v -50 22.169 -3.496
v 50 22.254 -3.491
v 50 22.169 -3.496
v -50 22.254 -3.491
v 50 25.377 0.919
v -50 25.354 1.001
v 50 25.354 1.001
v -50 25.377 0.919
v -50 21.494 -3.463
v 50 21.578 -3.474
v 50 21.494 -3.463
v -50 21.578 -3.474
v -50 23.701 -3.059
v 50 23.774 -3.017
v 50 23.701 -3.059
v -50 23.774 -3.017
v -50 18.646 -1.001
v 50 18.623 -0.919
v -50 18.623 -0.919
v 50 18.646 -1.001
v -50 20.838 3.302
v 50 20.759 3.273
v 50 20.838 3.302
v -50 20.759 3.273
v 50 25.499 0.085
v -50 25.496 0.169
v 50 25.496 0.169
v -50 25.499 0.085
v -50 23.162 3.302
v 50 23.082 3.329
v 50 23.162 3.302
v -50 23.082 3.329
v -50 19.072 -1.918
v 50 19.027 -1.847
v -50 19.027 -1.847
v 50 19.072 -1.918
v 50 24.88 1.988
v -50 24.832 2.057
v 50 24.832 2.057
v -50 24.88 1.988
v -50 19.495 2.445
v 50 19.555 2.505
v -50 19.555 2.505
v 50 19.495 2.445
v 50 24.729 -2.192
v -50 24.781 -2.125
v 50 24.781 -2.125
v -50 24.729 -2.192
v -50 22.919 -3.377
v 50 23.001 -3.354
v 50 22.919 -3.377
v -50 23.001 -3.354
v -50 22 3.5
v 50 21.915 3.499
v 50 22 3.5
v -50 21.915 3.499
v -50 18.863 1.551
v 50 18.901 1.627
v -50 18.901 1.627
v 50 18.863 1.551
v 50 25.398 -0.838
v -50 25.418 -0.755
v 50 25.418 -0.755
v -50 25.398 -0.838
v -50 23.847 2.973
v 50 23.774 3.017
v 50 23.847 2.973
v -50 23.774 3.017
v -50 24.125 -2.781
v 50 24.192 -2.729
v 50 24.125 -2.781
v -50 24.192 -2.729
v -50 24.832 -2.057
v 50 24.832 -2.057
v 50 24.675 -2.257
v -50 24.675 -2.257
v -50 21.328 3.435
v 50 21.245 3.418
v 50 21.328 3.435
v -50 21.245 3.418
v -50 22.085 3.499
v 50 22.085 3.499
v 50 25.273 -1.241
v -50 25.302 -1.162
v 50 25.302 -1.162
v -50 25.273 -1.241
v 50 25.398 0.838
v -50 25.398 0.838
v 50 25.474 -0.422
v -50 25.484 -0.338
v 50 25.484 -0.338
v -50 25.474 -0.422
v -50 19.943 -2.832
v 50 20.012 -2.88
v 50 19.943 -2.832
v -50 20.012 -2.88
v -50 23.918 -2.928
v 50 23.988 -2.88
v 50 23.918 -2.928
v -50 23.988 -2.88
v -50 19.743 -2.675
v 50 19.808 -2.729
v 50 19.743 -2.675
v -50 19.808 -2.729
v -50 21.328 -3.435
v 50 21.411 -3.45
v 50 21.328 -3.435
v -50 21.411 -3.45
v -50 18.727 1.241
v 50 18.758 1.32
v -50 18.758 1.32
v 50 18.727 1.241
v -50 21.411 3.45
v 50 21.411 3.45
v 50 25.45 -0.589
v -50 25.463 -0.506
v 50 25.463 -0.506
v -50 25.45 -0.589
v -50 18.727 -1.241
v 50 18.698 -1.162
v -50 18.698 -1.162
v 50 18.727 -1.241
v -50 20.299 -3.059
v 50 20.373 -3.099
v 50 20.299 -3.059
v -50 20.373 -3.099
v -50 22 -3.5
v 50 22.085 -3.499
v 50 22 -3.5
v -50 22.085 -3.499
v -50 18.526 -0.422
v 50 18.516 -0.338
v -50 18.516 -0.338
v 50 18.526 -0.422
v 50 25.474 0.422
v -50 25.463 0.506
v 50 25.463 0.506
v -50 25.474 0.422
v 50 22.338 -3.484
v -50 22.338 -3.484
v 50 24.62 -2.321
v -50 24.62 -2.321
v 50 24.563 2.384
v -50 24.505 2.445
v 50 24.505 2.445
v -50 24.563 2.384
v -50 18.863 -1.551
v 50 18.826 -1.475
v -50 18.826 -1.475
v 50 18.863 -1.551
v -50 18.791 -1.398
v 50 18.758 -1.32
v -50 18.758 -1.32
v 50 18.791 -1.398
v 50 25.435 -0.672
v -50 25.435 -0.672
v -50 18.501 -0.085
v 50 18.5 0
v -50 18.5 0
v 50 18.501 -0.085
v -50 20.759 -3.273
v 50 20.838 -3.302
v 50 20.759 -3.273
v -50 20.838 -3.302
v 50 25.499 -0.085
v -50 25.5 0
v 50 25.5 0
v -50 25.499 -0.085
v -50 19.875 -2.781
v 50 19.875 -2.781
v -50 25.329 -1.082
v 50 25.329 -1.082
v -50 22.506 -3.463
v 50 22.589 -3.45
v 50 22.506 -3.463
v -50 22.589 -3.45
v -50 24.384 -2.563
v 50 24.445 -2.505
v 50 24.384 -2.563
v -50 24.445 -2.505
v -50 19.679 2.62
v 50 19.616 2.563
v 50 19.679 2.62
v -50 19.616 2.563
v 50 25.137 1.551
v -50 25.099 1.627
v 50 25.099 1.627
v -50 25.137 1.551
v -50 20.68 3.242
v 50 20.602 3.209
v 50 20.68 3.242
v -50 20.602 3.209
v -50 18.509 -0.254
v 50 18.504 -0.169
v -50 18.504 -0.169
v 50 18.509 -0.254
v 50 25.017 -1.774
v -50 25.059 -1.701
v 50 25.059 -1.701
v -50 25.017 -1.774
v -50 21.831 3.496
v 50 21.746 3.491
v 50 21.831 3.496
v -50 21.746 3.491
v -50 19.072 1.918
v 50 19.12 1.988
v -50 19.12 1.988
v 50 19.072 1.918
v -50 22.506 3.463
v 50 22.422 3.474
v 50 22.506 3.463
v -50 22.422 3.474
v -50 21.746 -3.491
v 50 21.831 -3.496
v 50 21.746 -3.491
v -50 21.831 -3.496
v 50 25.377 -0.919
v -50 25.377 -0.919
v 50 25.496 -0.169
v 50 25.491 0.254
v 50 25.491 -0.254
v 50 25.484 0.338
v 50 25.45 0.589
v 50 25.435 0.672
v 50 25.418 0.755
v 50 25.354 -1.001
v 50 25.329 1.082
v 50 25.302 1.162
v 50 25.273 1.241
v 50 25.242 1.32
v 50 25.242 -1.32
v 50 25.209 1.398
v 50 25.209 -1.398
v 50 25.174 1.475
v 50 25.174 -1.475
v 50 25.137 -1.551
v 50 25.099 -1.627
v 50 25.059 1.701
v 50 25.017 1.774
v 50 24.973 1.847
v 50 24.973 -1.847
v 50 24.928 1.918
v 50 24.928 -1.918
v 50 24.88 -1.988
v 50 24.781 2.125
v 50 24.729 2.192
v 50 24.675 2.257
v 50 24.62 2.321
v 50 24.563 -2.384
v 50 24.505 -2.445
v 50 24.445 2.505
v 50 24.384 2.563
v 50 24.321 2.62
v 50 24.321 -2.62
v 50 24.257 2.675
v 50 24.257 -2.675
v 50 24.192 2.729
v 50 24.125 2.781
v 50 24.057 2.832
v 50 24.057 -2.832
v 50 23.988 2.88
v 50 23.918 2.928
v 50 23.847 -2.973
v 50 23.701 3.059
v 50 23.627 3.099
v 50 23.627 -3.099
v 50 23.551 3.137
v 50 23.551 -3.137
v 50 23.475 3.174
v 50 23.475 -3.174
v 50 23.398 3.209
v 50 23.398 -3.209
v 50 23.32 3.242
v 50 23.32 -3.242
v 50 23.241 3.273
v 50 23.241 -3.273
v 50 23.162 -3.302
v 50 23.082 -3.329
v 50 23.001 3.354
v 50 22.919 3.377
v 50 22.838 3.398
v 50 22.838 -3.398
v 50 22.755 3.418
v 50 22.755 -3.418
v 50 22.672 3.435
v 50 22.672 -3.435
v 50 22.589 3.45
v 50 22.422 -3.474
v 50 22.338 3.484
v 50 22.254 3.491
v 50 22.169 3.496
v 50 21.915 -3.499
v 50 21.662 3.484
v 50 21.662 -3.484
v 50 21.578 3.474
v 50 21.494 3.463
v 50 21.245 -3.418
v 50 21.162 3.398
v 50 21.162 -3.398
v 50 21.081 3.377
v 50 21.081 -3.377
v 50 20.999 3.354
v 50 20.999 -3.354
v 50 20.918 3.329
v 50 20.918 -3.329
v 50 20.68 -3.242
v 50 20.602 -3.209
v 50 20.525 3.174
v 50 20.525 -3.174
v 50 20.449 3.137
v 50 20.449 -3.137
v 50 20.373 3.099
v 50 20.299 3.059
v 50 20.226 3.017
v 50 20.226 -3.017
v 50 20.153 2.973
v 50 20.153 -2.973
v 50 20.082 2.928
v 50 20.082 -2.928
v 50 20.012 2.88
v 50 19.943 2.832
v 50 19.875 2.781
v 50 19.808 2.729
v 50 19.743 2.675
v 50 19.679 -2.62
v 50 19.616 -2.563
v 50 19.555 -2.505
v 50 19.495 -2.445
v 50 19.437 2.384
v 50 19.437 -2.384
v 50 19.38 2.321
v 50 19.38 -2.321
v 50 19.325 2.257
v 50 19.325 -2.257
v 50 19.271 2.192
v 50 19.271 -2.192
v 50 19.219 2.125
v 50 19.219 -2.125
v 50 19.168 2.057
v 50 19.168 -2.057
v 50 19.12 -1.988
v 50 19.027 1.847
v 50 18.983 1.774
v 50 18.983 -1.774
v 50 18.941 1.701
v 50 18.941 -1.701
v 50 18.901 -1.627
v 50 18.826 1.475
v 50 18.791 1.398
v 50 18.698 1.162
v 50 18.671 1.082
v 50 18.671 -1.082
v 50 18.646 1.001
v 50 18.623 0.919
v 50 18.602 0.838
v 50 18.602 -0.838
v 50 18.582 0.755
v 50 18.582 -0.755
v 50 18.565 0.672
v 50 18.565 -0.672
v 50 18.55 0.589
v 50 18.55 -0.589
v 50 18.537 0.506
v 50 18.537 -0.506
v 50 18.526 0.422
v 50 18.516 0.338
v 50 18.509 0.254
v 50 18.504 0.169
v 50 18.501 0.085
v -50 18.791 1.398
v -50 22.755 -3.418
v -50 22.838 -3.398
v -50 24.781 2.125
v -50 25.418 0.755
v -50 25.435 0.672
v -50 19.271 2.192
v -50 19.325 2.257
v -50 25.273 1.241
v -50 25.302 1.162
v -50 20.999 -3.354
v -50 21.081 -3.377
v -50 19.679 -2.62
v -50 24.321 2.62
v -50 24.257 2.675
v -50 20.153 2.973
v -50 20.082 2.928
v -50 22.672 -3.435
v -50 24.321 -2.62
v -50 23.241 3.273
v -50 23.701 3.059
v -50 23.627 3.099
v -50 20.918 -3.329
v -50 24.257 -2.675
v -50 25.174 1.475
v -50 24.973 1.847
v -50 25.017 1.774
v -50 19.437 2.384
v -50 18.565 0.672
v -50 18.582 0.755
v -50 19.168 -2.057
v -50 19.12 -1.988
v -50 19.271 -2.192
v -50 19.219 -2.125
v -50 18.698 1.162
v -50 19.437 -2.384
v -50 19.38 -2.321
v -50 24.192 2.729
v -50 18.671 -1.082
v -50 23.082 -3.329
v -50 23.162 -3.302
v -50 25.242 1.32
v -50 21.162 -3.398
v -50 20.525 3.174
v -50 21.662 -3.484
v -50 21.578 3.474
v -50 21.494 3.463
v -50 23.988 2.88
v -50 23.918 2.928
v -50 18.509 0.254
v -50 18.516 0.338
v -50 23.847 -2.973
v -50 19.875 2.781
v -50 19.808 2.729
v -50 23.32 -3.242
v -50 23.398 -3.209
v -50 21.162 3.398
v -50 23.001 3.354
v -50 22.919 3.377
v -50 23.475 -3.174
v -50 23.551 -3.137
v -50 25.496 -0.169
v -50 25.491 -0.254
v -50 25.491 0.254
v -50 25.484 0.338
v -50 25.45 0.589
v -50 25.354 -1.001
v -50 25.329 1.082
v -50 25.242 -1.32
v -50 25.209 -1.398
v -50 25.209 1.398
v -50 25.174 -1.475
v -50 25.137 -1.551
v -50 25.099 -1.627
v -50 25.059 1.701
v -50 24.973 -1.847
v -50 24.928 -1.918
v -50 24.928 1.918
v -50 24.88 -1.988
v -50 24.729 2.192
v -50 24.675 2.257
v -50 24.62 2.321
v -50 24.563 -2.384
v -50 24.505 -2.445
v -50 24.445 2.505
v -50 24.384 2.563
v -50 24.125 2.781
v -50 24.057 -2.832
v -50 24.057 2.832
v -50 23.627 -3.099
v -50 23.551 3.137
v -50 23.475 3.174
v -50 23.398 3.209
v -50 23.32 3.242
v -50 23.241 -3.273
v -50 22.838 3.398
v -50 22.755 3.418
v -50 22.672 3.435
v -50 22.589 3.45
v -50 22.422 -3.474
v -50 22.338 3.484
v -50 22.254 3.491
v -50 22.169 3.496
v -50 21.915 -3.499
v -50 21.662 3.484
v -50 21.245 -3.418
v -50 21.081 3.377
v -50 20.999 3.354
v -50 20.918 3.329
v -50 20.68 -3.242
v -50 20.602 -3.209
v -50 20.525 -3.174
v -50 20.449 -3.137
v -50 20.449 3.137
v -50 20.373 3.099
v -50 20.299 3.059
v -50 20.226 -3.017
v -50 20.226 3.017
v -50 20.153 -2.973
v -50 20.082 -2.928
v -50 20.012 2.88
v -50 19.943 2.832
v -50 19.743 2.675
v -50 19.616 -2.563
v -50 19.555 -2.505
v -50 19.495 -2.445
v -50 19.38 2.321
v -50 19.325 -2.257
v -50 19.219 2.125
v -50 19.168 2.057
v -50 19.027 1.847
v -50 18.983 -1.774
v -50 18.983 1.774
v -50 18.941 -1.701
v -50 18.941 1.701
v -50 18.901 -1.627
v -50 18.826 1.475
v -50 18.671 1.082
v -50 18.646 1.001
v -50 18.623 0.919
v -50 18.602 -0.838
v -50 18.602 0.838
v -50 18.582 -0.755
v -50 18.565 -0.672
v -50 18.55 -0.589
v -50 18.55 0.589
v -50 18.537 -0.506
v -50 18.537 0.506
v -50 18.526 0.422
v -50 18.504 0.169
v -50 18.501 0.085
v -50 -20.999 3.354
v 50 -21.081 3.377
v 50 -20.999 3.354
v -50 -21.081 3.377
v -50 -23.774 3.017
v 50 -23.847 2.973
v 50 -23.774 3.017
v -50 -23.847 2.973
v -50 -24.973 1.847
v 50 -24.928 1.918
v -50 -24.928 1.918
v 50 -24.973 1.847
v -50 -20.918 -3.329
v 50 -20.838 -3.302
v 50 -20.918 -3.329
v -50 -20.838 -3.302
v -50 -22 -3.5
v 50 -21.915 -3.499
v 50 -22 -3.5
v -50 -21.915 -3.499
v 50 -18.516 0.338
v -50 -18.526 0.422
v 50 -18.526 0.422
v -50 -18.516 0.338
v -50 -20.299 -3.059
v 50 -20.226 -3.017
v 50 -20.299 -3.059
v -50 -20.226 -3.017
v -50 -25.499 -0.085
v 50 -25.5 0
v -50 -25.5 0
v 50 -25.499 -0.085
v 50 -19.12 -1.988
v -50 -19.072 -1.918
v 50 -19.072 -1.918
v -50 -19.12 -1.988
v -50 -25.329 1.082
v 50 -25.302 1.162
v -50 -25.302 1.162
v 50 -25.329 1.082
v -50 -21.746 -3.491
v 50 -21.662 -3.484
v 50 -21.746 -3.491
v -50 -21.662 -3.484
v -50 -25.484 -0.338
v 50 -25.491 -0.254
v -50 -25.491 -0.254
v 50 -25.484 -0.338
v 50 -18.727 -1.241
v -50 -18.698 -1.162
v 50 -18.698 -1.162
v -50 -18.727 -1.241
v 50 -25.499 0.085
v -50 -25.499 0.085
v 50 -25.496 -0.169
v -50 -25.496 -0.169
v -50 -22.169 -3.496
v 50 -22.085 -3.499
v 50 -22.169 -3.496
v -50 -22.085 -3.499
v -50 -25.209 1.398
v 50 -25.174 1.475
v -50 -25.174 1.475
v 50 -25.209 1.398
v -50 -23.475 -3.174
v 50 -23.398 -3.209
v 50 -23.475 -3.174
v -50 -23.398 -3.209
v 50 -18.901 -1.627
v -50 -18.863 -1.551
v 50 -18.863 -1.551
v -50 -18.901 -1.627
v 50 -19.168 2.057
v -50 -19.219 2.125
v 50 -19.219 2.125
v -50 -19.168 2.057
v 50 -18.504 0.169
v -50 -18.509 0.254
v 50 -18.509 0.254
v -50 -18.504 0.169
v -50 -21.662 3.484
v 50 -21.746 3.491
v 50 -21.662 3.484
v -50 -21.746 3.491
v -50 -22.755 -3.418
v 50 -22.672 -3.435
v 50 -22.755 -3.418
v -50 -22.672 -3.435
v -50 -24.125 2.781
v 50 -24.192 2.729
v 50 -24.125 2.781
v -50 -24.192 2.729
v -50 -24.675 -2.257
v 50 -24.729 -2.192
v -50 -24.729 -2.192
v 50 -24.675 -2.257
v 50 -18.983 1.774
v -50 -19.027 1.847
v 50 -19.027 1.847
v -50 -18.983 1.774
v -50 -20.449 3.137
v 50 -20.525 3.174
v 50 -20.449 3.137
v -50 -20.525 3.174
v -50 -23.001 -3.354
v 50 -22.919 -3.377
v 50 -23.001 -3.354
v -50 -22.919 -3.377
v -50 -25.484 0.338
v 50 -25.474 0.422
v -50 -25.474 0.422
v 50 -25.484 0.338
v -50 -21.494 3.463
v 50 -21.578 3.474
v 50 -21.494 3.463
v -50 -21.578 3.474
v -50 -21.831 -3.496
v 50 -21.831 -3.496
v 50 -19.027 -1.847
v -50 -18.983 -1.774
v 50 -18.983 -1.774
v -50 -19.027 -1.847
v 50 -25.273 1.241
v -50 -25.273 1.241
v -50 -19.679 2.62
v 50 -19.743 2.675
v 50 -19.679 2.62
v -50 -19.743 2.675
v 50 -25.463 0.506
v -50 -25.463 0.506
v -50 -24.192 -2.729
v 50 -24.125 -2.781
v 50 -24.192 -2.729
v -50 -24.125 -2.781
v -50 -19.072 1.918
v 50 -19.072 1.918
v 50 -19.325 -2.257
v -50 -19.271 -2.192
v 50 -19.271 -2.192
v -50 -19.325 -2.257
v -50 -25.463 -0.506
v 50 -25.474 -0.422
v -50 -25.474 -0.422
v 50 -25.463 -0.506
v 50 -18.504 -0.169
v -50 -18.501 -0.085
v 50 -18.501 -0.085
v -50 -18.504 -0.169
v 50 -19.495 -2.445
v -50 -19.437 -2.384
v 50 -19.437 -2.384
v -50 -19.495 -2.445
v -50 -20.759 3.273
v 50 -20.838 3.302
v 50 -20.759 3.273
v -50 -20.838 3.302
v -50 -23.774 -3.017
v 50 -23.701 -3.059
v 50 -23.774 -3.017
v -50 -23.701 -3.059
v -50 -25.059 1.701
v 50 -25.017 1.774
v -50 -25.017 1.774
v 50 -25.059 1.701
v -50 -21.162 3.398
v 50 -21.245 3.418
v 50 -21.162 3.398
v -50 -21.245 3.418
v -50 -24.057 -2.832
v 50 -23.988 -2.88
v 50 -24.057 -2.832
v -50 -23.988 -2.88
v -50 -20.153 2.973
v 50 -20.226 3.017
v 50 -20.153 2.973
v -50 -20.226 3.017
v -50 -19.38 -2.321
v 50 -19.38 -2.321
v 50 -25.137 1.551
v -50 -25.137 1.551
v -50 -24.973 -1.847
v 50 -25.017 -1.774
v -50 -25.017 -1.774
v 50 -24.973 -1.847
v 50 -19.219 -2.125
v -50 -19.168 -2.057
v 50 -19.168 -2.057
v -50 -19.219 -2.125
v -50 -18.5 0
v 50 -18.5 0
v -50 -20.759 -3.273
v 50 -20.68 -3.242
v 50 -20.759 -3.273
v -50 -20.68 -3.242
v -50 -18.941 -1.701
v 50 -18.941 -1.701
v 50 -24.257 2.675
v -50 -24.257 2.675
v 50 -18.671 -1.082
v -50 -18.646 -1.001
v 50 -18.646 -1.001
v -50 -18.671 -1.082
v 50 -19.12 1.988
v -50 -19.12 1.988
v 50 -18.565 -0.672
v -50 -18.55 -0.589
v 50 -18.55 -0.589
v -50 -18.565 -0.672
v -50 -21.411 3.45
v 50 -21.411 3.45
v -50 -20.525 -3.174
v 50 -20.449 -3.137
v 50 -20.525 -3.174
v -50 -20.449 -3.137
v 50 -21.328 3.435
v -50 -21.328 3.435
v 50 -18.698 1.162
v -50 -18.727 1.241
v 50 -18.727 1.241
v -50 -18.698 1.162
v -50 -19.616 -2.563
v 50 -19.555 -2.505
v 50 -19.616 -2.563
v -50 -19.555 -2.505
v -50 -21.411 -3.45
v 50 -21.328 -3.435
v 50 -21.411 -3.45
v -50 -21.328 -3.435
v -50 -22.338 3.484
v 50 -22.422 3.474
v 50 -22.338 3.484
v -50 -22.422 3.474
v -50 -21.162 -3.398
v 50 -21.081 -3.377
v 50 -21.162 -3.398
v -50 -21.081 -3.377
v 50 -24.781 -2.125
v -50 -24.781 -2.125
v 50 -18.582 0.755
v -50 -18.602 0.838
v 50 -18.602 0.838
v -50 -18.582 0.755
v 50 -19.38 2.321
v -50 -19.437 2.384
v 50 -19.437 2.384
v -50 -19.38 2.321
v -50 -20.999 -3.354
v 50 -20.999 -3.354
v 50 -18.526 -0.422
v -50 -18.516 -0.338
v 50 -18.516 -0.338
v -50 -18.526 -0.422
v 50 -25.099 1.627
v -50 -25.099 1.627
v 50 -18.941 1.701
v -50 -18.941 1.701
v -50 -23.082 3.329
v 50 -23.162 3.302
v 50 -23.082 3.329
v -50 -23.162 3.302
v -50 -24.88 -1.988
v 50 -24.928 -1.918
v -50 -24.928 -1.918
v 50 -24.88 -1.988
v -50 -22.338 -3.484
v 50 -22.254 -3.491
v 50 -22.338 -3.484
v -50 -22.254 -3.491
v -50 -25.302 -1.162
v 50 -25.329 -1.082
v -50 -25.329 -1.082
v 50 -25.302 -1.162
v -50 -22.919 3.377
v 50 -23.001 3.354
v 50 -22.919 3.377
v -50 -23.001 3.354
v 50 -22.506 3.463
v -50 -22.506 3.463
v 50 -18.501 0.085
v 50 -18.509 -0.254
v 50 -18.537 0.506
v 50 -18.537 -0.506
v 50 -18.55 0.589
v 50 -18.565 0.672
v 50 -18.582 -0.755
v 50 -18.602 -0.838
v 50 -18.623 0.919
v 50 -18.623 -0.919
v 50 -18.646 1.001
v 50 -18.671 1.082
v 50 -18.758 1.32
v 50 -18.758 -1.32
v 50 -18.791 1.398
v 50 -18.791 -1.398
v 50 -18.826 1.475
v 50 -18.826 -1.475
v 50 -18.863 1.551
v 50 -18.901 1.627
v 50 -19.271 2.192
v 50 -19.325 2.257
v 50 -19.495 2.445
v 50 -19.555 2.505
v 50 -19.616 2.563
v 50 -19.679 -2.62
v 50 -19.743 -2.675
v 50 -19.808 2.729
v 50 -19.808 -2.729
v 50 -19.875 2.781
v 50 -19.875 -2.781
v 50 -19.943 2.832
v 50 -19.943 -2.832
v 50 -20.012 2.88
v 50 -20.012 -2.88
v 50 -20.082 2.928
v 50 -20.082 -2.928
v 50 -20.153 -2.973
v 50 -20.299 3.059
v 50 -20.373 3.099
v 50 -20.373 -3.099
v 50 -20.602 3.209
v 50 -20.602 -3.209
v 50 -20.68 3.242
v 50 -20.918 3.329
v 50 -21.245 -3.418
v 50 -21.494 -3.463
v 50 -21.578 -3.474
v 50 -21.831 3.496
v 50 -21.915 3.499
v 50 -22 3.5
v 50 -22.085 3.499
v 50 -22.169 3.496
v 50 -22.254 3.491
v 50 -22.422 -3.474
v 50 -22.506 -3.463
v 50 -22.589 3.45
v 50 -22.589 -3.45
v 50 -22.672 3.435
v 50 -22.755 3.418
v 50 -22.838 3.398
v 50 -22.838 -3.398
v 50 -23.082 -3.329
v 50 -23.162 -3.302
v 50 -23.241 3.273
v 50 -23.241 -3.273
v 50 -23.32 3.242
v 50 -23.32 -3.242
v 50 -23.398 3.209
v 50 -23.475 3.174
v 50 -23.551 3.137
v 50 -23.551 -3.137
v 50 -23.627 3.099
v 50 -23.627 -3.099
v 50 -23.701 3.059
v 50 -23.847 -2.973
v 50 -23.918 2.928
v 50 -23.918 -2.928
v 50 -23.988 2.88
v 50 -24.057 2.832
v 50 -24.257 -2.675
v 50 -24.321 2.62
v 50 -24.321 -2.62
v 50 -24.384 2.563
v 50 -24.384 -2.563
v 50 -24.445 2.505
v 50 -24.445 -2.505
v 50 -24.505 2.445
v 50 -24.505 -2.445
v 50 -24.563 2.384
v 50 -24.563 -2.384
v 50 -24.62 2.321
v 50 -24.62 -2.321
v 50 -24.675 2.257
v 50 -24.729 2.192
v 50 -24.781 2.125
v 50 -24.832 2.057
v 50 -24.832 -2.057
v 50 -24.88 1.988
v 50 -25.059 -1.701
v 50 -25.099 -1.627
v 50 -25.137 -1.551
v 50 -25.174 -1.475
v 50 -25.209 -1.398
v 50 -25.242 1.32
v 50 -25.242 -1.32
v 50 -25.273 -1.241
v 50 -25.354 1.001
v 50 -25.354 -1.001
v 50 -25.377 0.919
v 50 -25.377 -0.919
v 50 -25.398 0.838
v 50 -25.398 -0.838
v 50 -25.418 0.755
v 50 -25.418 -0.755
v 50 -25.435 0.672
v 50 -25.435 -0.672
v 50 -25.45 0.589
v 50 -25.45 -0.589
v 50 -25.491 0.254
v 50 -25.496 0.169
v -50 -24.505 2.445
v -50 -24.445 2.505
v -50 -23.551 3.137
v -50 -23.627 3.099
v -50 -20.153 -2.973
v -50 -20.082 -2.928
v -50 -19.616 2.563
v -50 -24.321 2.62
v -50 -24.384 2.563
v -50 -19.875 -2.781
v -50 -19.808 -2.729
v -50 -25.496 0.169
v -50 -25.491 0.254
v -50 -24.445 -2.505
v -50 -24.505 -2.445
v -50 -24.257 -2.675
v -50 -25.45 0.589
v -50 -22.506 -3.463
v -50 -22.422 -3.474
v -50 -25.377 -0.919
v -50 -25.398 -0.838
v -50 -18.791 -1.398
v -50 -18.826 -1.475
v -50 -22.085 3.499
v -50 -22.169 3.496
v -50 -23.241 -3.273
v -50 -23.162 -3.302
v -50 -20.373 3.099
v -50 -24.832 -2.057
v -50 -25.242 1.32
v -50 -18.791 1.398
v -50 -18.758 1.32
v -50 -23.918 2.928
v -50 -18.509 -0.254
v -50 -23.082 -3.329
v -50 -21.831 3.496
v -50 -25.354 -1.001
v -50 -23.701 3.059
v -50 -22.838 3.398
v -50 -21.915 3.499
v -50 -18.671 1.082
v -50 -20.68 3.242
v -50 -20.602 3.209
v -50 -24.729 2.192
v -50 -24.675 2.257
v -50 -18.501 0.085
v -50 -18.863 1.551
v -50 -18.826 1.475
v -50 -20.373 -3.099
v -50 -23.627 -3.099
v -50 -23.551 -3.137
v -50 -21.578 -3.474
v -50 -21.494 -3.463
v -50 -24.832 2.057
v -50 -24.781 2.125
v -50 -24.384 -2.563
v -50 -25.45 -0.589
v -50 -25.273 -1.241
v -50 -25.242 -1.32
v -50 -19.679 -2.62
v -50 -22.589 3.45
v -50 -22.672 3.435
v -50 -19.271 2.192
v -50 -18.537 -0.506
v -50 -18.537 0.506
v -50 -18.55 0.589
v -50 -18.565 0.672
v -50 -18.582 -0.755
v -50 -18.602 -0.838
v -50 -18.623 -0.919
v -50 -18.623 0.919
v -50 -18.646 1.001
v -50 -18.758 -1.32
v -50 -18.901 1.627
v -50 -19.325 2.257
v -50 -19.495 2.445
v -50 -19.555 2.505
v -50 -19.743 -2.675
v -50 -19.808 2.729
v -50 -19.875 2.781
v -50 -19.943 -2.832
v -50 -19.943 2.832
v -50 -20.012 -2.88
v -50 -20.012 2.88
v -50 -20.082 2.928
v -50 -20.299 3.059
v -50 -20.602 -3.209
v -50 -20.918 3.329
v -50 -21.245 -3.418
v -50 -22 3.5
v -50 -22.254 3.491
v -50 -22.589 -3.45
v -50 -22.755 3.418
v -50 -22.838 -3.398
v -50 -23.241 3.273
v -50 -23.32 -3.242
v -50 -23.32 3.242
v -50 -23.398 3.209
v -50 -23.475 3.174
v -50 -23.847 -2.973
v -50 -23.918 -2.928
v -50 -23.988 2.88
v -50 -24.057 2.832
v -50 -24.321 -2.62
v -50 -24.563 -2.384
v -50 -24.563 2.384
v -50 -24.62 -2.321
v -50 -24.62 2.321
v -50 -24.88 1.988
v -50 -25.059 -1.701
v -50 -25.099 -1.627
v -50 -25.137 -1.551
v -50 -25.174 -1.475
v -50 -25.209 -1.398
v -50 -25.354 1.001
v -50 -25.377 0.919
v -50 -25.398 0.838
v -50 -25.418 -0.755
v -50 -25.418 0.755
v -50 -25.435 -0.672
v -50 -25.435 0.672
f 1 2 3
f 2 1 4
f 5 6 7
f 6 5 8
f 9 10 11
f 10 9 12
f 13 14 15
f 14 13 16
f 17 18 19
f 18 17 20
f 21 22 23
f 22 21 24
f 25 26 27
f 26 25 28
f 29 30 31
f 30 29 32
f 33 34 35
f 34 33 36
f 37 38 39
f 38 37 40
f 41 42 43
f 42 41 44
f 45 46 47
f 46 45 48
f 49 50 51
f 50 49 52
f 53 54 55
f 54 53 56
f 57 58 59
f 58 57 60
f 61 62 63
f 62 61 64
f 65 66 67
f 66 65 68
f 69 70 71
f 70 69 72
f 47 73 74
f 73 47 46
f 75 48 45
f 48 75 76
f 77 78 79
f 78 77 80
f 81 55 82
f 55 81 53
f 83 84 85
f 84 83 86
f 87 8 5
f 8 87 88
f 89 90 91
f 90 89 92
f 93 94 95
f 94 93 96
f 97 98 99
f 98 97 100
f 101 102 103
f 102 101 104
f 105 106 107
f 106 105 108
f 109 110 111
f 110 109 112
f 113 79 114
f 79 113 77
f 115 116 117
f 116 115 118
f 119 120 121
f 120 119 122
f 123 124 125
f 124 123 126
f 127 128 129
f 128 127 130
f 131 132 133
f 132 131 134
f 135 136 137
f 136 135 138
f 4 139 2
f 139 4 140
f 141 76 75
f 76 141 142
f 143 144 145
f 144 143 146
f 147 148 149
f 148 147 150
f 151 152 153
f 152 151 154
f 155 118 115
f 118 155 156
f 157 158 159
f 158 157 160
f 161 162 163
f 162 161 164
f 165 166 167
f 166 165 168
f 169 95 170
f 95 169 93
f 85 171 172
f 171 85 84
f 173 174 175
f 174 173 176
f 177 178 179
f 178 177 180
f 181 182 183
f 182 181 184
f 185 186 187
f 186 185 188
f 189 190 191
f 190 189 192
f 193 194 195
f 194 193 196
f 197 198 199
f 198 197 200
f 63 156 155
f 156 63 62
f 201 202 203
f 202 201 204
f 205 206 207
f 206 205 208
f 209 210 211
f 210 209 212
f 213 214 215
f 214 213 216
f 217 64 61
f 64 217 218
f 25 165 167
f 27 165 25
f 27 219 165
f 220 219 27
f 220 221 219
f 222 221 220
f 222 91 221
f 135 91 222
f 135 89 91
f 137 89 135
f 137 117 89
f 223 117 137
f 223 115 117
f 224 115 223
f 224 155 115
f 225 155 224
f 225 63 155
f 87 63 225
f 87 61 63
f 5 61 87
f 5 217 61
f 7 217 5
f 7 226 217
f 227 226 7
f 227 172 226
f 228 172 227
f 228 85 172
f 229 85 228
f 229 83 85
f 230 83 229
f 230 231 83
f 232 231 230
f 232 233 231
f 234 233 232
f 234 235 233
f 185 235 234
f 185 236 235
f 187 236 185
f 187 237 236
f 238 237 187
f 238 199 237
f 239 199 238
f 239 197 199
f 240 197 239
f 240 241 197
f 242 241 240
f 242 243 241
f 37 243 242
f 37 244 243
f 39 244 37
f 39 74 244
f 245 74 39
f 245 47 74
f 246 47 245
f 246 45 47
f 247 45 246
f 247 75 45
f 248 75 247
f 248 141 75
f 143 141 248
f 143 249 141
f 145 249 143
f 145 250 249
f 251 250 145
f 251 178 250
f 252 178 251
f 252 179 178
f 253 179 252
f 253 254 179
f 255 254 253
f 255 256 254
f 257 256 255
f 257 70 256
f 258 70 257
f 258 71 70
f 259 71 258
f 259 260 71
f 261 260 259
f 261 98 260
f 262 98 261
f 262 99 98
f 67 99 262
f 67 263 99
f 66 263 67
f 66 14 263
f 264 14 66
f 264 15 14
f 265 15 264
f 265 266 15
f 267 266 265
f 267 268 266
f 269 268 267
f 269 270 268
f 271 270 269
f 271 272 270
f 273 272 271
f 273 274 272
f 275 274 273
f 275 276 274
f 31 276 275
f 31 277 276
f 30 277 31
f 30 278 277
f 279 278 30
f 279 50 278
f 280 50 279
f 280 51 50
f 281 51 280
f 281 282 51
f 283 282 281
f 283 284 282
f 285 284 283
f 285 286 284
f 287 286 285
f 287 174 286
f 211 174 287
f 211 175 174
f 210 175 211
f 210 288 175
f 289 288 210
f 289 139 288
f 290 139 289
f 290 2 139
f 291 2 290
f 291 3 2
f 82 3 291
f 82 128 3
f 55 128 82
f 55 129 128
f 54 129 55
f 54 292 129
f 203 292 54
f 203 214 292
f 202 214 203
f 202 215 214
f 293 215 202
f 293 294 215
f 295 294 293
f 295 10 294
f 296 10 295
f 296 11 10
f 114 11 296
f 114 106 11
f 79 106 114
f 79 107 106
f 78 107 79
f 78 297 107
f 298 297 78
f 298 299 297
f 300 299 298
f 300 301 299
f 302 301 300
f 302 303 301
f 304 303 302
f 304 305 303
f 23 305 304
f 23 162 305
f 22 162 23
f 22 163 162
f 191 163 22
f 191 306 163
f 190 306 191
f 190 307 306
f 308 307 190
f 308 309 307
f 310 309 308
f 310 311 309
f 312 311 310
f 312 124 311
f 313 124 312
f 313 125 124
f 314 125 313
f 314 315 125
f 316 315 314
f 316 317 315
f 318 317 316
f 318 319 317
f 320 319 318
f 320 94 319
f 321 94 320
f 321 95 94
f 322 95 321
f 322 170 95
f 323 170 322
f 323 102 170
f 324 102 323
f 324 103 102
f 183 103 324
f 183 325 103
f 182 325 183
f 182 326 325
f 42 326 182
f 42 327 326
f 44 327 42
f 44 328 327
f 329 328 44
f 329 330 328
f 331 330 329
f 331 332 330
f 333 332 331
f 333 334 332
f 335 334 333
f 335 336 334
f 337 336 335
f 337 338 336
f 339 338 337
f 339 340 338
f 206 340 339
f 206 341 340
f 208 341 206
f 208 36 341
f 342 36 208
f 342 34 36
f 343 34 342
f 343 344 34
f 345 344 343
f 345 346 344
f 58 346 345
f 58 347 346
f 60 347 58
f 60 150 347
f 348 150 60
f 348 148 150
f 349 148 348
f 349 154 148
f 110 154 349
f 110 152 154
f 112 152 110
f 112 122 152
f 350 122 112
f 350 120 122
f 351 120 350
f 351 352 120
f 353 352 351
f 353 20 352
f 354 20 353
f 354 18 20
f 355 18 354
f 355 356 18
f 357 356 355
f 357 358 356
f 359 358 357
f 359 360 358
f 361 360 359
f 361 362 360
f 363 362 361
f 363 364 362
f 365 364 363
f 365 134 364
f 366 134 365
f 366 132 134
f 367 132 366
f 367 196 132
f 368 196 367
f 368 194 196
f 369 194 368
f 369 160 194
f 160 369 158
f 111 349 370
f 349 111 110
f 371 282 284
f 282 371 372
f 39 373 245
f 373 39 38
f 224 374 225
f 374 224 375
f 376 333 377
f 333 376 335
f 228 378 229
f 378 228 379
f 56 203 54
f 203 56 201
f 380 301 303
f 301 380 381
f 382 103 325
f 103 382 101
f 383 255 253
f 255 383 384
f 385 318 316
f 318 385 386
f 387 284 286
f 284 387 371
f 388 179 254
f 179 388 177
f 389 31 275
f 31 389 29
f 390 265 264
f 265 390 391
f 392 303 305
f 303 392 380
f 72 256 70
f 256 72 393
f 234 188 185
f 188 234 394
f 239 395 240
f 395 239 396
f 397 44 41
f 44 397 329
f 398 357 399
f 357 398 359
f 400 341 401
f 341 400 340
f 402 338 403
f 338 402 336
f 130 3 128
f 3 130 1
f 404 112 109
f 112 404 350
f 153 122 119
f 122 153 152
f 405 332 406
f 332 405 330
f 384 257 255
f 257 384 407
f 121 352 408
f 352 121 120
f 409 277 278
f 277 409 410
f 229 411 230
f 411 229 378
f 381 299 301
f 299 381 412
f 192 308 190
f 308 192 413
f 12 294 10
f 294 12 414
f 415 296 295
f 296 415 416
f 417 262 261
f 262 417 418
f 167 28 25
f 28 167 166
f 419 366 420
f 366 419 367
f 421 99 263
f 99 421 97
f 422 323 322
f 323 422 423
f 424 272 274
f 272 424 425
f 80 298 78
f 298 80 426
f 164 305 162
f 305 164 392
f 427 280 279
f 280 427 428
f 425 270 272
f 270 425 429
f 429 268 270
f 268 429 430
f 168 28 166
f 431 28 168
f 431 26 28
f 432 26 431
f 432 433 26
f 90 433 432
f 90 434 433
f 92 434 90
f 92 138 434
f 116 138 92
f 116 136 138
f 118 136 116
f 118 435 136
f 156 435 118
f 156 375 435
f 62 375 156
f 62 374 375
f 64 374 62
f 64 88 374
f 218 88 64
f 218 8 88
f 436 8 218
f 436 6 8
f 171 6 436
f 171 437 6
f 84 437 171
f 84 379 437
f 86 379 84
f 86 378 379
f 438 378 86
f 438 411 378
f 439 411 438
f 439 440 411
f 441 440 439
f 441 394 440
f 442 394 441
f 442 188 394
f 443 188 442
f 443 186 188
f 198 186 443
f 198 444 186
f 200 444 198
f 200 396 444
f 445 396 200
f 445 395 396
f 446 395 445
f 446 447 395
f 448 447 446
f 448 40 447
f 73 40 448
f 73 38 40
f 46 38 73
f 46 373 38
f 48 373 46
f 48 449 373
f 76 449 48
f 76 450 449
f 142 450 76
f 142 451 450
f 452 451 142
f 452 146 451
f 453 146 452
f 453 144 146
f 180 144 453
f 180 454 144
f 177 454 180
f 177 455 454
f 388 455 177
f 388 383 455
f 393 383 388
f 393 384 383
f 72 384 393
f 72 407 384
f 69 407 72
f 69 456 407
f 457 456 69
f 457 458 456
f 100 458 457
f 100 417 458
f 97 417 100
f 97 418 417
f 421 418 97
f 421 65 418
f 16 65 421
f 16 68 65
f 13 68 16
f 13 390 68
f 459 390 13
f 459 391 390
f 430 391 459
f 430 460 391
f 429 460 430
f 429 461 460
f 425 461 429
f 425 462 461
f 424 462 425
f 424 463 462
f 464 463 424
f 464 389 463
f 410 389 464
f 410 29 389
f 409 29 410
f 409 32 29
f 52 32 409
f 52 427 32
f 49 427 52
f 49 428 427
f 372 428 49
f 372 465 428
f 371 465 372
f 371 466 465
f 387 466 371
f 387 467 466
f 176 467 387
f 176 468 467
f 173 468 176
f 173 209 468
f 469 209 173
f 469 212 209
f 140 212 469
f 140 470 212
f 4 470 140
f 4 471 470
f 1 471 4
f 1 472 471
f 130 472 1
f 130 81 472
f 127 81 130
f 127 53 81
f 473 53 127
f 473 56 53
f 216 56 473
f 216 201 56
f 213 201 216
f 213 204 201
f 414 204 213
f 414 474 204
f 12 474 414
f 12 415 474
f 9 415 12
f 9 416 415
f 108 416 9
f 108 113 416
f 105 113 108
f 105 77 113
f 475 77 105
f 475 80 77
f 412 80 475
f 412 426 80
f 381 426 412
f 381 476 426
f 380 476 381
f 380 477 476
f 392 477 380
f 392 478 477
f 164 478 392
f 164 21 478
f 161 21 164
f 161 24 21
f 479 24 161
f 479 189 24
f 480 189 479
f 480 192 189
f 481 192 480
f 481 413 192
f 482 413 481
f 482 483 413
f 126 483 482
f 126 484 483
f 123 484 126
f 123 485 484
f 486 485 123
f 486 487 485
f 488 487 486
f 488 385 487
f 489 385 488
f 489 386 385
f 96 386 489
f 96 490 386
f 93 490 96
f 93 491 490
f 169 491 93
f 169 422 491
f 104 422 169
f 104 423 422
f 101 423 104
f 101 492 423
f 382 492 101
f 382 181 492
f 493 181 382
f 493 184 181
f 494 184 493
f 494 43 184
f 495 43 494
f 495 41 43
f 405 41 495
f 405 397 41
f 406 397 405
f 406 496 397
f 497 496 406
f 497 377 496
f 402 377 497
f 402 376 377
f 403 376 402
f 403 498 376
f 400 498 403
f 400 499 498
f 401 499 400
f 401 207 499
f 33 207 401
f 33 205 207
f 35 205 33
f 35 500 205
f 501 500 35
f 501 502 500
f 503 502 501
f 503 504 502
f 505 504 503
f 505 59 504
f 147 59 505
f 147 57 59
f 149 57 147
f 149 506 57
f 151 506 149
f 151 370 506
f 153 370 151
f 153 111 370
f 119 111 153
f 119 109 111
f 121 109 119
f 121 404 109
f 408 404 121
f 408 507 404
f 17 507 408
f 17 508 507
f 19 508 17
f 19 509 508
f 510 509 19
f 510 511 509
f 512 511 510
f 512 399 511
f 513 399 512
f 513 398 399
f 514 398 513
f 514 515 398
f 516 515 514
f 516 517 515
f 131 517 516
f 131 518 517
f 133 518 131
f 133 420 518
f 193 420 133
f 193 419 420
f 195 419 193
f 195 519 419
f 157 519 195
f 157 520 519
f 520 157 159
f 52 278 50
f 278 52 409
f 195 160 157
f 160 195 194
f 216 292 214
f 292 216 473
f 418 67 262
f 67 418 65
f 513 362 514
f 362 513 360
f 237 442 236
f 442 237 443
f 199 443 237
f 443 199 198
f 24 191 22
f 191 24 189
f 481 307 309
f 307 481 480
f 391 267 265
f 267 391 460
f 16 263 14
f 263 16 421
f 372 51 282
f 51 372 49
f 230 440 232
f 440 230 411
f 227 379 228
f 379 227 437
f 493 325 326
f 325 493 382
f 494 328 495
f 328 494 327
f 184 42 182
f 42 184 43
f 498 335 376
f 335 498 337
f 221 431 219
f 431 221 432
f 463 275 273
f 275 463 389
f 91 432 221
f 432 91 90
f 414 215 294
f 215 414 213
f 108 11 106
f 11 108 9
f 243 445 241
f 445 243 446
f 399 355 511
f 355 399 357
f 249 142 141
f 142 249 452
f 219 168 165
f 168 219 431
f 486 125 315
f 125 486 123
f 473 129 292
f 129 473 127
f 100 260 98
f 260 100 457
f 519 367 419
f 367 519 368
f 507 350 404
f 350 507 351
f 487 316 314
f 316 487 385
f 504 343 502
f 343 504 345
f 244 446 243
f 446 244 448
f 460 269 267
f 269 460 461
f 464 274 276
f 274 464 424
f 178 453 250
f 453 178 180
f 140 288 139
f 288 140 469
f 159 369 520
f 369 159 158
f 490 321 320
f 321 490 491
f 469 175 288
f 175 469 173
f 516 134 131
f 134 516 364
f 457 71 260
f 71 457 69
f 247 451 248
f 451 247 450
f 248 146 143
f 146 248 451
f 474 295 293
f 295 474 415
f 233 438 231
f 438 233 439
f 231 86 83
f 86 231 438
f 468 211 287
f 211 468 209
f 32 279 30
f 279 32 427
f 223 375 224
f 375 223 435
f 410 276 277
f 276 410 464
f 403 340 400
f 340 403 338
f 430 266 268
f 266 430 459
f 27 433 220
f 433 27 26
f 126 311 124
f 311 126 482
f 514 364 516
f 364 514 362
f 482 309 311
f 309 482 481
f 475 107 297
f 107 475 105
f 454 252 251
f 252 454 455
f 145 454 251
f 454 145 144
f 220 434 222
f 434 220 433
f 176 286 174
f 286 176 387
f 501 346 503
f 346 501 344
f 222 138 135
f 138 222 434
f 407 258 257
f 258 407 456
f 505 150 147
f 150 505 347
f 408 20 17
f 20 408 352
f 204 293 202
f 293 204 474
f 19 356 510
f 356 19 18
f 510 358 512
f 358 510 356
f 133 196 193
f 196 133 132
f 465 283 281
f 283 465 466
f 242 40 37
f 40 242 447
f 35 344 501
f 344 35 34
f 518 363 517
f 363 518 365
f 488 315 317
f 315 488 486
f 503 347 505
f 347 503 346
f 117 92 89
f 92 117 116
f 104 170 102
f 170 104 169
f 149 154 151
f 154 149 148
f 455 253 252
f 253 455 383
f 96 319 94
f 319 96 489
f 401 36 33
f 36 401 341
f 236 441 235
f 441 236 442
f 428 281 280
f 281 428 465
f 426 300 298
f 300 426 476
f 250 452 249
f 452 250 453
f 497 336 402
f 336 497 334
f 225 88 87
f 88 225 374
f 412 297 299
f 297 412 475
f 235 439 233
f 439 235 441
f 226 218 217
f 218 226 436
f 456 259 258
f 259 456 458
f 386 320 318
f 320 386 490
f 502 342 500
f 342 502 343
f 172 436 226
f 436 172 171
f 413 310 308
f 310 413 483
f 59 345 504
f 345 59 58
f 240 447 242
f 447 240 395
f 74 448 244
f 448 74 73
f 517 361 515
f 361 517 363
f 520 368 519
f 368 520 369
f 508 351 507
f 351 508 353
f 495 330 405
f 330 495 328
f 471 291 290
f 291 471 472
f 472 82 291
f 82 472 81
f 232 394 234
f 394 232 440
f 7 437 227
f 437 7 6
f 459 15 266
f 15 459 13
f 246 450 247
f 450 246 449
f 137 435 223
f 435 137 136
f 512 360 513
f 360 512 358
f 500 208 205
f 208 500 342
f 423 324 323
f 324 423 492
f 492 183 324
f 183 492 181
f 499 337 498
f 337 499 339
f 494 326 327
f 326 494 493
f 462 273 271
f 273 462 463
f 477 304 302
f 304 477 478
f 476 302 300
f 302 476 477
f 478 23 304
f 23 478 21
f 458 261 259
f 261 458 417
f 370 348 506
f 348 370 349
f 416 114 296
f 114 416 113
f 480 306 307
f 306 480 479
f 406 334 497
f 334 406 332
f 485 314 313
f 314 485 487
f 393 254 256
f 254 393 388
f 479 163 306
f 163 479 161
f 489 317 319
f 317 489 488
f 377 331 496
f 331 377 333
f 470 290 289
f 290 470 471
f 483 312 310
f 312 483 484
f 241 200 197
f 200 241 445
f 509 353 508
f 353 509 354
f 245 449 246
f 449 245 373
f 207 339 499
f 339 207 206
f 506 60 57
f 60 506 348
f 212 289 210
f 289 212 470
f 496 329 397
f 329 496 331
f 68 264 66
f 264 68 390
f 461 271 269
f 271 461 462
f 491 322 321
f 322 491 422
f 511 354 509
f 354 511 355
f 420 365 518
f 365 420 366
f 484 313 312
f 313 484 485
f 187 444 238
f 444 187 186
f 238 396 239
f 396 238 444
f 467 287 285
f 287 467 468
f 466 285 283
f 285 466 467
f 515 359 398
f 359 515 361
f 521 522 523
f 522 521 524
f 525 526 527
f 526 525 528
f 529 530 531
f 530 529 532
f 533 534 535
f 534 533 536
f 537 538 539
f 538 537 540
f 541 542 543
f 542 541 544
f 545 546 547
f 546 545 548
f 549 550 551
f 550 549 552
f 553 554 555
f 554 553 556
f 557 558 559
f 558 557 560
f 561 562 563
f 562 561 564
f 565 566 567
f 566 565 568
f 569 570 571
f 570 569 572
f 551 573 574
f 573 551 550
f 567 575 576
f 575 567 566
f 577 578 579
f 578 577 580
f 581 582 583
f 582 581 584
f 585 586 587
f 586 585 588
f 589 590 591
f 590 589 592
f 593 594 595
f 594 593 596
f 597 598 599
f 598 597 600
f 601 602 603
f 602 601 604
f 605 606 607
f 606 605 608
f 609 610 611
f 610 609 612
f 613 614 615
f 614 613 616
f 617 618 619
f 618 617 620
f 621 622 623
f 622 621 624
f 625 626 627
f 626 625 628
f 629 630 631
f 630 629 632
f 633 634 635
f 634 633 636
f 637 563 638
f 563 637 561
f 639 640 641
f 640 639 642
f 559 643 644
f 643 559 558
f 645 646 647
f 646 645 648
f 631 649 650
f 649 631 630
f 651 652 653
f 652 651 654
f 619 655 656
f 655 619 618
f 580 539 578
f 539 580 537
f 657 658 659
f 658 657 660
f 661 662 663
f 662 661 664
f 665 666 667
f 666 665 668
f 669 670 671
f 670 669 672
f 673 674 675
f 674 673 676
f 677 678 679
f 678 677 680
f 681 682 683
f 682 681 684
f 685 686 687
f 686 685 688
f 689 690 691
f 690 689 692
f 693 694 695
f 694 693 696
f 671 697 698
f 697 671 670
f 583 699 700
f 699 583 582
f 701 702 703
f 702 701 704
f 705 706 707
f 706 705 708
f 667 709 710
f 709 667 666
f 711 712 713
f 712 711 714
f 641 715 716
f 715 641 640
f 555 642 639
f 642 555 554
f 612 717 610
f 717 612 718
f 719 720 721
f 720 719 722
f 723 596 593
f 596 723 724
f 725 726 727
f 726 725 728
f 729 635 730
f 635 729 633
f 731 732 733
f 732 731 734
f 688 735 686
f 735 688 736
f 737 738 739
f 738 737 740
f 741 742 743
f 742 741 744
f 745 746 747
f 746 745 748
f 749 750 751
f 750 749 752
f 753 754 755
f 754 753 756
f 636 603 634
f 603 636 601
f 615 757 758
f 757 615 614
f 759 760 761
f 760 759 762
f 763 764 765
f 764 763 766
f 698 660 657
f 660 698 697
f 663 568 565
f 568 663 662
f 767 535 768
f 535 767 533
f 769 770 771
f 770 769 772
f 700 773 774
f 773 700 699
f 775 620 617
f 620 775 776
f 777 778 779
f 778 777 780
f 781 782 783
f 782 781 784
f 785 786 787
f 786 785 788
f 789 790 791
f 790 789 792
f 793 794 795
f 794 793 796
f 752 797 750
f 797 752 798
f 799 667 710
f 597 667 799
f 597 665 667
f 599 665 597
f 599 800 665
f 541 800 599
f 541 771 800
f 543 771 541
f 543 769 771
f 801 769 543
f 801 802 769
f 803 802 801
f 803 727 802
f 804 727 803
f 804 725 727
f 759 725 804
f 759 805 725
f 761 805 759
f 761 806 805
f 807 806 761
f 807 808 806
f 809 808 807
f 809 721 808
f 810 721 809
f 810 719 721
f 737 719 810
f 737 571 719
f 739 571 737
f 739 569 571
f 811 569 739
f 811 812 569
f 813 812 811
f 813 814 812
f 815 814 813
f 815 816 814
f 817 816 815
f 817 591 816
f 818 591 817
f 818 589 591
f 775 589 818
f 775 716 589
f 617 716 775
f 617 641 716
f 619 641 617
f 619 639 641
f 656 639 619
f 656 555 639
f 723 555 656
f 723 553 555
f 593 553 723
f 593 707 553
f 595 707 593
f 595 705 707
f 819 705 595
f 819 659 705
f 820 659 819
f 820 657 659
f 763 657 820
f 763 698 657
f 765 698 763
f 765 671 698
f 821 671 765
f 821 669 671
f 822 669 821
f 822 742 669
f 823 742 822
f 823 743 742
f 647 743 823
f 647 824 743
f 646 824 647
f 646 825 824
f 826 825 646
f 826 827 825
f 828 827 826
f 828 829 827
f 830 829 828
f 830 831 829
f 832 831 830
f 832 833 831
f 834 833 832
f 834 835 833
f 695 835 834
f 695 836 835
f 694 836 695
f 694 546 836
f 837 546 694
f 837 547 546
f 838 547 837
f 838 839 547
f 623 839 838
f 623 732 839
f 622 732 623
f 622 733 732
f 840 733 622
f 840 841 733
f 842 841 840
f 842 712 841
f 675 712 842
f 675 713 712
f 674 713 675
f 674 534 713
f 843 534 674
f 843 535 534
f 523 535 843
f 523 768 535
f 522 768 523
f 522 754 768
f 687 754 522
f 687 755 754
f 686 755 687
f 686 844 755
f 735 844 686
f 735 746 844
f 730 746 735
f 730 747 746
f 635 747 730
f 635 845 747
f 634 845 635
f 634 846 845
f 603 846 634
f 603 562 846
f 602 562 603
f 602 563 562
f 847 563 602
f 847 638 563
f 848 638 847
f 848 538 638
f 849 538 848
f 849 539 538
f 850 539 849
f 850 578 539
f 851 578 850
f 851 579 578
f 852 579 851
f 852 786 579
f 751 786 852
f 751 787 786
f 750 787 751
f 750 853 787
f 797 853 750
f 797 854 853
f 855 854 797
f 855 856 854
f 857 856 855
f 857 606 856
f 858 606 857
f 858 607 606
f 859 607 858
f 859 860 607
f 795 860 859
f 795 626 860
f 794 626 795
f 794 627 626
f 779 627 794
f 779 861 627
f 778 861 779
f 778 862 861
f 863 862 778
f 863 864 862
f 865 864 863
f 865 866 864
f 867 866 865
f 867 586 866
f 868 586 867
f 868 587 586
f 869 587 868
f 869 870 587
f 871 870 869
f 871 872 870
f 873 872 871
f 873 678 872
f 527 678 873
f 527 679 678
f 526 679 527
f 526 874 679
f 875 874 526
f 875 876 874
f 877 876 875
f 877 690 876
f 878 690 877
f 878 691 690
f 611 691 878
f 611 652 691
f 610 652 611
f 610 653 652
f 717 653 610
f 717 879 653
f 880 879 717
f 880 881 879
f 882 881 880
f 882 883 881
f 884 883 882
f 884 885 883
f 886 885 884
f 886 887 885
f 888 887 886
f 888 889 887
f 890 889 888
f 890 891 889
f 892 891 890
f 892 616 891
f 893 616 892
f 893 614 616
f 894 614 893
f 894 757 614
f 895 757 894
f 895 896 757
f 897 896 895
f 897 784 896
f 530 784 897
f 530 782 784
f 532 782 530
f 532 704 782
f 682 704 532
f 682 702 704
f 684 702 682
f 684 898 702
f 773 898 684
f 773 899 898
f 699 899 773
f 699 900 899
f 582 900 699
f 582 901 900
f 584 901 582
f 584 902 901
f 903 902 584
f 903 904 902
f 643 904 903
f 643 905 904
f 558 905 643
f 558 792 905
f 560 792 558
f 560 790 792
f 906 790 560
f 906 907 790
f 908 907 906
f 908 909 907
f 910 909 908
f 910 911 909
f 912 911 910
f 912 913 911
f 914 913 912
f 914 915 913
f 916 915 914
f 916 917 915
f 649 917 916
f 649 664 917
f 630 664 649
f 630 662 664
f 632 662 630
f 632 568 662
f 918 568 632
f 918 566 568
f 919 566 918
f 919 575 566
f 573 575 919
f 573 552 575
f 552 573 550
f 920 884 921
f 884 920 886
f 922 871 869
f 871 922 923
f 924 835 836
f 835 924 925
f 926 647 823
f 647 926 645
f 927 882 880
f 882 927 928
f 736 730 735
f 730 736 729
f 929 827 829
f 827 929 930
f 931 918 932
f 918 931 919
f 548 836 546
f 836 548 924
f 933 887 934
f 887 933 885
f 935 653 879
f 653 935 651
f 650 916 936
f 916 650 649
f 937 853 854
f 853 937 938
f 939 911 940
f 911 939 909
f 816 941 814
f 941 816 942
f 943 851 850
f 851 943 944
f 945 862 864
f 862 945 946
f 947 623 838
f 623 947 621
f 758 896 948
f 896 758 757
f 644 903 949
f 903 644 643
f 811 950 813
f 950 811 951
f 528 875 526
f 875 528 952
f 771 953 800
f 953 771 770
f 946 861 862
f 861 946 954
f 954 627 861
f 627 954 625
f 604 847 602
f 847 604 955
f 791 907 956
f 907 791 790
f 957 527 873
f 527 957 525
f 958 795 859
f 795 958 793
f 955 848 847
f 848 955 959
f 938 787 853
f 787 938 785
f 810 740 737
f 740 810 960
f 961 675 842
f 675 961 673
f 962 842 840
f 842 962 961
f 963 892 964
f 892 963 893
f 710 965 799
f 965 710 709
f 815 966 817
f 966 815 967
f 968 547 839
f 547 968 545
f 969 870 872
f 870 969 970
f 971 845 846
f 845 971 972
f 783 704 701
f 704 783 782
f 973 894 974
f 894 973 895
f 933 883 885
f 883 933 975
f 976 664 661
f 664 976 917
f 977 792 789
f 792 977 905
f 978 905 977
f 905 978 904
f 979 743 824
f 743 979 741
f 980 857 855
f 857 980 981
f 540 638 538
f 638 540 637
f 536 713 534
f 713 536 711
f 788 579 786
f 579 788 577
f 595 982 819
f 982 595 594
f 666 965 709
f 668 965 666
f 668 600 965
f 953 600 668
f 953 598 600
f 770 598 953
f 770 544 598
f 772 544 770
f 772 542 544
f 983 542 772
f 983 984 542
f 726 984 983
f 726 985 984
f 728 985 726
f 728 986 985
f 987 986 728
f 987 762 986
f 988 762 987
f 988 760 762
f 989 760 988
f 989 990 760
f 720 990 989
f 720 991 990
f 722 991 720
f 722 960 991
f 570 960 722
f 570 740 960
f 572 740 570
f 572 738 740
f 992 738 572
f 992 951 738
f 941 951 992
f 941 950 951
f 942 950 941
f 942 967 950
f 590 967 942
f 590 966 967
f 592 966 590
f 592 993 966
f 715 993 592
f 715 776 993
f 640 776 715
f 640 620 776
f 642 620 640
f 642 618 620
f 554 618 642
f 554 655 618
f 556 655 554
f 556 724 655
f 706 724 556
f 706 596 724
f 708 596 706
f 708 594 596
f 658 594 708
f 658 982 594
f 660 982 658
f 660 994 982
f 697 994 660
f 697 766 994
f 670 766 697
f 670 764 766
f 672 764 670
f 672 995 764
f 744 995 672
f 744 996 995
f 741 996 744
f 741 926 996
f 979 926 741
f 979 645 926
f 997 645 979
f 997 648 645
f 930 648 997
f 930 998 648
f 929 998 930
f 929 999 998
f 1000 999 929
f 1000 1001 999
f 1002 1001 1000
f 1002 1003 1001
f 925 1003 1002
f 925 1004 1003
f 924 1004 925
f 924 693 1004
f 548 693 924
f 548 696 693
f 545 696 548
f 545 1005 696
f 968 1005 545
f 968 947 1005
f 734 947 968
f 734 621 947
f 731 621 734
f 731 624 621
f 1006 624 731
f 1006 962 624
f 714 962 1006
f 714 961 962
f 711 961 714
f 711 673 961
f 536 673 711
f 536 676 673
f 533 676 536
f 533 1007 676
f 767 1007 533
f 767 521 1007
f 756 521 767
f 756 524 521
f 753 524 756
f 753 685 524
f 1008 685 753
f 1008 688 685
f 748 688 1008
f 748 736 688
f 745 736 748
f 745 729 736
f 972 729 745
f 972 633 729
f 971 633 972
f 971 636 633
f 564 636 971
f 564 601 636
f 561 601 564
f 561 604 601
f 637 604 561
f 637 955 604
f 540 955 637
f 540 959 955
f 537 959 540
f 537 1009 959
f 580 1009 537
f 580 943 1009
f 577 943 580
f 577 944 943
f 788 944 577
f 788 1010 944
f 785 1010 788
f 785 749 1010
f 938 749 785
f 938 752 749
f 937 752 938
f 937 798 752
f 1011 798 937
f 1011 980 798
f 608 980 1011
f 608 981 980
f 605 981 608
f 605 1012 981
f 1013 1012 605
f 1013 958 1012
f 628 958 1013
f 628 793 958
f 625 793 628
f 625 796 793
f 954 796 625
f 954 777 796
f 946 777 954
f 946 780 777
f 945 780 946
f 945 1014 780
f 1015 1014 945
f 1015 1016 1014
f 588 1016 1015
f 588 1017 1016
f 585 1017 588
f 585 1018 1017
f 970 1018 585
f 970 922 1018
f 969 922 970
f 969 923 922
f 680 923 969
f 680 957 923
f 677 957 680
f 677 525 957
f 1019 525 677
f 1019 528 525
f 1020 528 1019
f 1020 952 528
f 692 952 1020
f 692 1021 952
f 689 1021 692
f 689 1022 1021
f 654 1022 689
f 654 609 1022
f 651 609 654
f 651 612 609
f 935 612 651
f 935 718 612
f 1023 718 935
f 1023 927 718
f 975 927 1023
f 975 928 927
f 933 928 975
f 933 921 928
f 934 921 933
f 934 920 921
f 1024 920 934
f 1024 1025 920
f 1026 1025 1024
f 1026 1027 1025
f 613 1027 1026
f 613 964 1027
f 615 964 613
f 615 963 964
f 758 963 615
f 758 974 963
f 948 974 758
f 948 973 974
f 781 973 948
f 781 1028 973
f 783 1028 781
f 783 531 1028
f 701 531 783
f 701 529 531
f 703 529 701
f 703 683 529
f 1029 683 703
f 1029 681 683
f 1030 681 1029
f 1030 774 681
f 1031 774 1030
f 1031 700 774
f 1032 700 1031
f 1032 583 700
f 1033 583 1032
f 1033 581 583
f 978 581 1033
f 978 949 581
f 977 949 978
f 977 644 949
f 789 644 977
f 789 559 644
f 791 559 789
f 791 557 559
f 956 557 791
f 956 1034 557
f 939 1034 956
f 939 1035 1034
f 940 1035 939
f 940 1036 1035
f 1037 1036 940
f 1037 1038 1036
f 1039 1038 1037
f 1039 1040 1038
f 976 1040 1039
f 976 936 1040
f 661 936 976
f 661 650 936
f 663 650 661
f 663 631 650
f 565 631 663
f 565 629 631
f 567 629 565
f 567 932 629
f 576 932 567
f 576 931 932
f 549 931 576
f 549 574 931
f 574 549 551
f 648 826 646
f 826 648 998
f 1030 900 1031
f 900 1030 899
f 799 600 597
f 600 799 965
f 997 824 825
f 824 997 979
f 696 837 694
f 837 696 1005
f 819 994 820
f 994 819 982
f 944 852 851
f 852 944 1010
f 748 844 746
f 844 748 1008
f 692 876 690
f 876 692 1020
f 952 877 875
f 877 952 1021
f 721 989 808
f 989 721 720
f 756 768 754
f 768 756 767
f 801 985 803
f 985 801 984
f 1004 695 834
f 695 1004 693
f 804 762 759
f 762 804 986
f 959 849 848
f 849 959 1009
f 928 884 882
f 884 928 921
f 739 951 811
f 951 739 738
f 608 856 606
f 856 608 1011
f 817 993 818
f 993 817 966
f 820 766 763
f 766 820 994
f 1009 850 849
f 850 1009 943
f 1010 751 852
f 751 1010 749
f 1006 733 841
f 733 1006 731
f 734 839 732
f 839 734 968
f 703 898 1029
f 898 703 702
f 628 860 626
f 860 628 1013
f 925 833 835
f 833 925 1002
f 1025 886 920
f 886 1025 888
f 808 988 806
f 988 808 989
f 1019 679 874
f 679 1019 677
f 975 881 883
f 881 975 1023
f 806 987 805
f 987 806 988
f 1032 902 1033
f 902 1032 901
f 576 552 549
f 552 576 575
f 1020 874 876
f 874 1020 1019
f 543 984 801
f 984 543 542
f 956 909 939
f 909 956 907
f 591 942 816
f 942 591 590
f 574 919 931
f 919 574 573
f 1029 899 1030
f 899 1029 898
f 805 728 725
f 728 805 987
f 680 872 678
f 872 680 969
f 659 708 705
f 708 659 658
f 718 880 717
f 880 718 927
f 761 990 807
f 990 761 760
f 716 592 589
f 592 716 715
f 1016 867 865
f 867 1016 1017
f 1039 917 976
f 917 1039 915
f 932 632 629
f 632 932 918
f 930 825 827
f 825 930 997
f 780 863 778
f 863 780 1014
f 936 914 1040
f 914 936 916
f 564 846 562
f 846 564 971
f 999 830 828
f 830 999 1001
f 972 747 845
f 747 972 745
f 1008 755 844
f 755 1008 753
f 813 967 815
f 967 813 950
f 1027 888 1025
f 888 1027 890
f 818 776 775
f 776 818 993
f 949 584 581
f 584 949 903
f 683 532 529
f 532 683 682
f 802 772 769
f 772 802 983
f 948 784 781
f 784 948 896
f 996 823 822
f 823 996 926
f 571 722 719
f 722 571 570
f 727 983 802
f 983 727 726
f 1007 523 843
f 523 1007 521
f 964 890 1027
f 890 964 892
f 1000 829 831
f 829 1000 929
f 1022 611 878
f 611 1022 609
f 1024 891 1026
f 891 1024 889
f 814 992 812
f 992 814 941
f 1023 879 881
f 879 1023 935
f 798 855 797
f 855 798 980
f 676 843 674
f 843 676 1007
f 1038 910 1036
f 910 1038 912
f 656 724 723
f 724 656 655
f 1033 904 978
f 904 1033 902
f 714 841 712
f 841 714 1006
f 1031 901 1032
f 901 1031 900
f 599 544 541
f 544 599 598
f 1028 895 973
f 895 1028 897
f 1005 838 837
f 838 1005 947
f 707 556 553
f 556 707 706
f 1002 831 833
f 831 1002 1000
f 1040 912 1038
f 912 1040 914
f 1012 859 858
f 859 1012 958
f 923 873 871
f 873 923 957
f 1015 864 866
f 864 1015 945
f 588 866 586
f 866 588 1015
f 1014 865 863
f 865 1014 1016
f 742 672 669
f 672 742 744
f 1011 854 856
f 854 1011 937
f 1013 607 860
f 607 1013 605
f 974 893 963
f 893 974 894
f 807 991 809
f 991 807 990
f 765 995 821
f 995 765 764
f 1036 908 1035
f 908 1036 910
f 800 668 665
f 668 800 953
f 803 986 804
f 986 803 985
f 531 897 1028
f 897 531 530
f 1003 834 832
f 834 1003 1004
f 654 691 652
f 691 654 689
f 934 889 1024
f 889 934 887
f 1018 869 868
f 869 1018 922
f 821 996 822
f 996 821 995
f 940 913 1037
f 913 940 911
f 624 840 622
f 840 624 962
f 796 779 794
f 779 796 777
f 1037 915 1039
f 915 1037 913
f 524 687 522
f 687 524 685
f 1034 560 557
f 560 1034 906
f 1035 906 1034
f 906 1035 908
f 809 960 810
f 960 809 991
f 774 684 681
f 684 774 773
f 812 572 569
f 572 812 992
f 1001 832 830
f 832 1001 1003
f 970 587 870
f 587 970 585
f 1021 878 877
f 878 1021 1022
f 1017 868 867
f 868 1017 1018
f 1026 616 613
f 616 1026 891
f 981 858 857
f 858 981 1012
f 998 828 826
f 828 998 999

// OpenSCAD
// file: ../SteererTubeToolHolder/SteererTubeToolHolder.scad
$fn=260;

module inside_curve(rad, height){
    difference(){
        cube([rad, rad, height]);
        translate([0,0,-1]){
            cylinder(height+2, r = rad);
        }
    }
    
}

module o_ring(d_small, d_big){
    difference(){
        cylinder(h=d_small, d=d_big+(d_small*2));
        translate([0, 0, -0.1]){
            cylinder(h=d_small*2, d=d_big);
        }
    }
}
module side_rounded_end(offset_amt, side_thick){
    // side rounded end
    //translate([(-(side_thick/2)),0,offset_amt]){
    translate([(-(side_thick/2)),0,offset_amt]){
        rotate([0,90,0]){
            cylinder(d=11, h=side_thick);
        }   
    }
}
module tool_side(trans_amt, length=51){
    thick=2.5;
    if(trans_amt > 0){
        trans_amt2 = trans_amt+thick/2;
        translate([trans_amt2,0,0]){
            // total len 61
            union(){
                // side
                cube([thick, 11, length], center=true);
                // side rounded end
                side_rounded_end(offset_amt=length/2, side_thick=thick);
                side_rounded_end(offset_amt=-length/2, side_thick=thick);
            }
        }
    }
    else{
        trans_amt2 = trans_amt-thick/2;
        translate([trans_amt2,0,0]){
            // total len 61
            union(){
                // side
                cube([thick, 11, length], center=true);
                // side rounded end
                side_rounded_end(offset_amt=length/2, side_thick=thick);
                side_rounded_end(offset_amt=-length/2, side_thick=thick);
            }
        }
    }        
}
// internal part of tool
module tools(length, tools_thick){
    // ends
    translate([-tools_thick/2,0,-length/2]){
        rotate([0,90,0]){
            cylinder(h=tools_thick,d=10);
        }
    }
    translate([-tools_thick/2,0,length/2]){
        rotate([0,90,0]){
            cylinder(h=tools_thick,d=10);
        }
    }
    // body
    translate([0,0,0]){
        cube([tools_thick, 10, length], center=true);
    }
}

    
module tools_cutout(shrink_z_percent,shift_amt, tools_thick){
        translate([0,-shift_amt,0]){
            scale([1,0.5,shrink_z_percent]){
                tools(length=76.2, tools_thick=tools_thick);
            }
        }
    }    
module tool(cut=false){
    tools_thick=16.3;

    difference(){
        tools(length=51, tools_thick=tools_thick);
        
        // cut out of tool middle
        // shift all the way out.... 1/2 of full size "tools" and 1/2 of scaled "tools"
        shift_out = (10/2 + 5/2);
 
        if(cut==true){
            // this makes smooth inside curves for tools chunk.
            // then shift back in by amount to cut from "tools"
            shift_amt = shift_out - 0.25;
            tools_cutout(shrink_z_percent=0.585, shift_amt=shift_amt, tools_thick=tools_thick);
        }else{
            // then shift back in by amount to cut from "tools"
            shift_amt = shift_out - 4;
            tools_cutout(shrink_z_percent=0.5, shift_amt=shift_amt, tools_thick=tools_thick);
        }
        
    }
    tool_side(trans_amt=tools_thick/2 - 0.01);
    tool_side(trans_amt=tools_thick/-2 + 0.01);

}

module body(){
    top_thick = 3.6;

    intersection(){
        union(){
            translate([0,0,-top_thick+0.1]){
                // center of top
                cylinder(h=top_thick, d=32.2);
                intersection(){
                    // wings
                    cylinder(h=top_thick, d1=40.2, d2=32.2);
                    // only wings
                    cube([45,14,10], center=true);
                    // bevel
                    cylinder(h=top_thick, d1=38, d2=40);
                    
                }
            }
            // inside part
            difference(){
                cylinder(h=20, d=21.25);
                // o-ring groove
                translate([0,0,2]){
                    o_ring(d_small=2, d_big=18.5);
                }
                // tool hole
                translate([0,0,51/2+top_thick+6]){
                    tool(cut=true);
                }
            }
        }
        // add bevel by making union with giant cone
        translate([0,0,-top_thick]){
            cylinder(h=20, d1=40, d2=19);
        }
    }
}   
//o_ring(d_small=2, d_big=18.6);
//body();
//.tool();
// main file
rail_spacing=44;
rail_dia=7;

include <../SteererTubeToolHolder/SteererTubeToolHolder.scad>;

module rail(){
    translate([0,rail_spacing/2,0]){
        rotate([0,90,0]){
            cylinder(d=rail_dia, h=100, center=true);
        }
    }    
}
module rails(){
    rail();
    mirror([0,1,0]){
        rail();
    }
}

module tool_holder(){
    difference(){
        import("");
    }
}

rails();
